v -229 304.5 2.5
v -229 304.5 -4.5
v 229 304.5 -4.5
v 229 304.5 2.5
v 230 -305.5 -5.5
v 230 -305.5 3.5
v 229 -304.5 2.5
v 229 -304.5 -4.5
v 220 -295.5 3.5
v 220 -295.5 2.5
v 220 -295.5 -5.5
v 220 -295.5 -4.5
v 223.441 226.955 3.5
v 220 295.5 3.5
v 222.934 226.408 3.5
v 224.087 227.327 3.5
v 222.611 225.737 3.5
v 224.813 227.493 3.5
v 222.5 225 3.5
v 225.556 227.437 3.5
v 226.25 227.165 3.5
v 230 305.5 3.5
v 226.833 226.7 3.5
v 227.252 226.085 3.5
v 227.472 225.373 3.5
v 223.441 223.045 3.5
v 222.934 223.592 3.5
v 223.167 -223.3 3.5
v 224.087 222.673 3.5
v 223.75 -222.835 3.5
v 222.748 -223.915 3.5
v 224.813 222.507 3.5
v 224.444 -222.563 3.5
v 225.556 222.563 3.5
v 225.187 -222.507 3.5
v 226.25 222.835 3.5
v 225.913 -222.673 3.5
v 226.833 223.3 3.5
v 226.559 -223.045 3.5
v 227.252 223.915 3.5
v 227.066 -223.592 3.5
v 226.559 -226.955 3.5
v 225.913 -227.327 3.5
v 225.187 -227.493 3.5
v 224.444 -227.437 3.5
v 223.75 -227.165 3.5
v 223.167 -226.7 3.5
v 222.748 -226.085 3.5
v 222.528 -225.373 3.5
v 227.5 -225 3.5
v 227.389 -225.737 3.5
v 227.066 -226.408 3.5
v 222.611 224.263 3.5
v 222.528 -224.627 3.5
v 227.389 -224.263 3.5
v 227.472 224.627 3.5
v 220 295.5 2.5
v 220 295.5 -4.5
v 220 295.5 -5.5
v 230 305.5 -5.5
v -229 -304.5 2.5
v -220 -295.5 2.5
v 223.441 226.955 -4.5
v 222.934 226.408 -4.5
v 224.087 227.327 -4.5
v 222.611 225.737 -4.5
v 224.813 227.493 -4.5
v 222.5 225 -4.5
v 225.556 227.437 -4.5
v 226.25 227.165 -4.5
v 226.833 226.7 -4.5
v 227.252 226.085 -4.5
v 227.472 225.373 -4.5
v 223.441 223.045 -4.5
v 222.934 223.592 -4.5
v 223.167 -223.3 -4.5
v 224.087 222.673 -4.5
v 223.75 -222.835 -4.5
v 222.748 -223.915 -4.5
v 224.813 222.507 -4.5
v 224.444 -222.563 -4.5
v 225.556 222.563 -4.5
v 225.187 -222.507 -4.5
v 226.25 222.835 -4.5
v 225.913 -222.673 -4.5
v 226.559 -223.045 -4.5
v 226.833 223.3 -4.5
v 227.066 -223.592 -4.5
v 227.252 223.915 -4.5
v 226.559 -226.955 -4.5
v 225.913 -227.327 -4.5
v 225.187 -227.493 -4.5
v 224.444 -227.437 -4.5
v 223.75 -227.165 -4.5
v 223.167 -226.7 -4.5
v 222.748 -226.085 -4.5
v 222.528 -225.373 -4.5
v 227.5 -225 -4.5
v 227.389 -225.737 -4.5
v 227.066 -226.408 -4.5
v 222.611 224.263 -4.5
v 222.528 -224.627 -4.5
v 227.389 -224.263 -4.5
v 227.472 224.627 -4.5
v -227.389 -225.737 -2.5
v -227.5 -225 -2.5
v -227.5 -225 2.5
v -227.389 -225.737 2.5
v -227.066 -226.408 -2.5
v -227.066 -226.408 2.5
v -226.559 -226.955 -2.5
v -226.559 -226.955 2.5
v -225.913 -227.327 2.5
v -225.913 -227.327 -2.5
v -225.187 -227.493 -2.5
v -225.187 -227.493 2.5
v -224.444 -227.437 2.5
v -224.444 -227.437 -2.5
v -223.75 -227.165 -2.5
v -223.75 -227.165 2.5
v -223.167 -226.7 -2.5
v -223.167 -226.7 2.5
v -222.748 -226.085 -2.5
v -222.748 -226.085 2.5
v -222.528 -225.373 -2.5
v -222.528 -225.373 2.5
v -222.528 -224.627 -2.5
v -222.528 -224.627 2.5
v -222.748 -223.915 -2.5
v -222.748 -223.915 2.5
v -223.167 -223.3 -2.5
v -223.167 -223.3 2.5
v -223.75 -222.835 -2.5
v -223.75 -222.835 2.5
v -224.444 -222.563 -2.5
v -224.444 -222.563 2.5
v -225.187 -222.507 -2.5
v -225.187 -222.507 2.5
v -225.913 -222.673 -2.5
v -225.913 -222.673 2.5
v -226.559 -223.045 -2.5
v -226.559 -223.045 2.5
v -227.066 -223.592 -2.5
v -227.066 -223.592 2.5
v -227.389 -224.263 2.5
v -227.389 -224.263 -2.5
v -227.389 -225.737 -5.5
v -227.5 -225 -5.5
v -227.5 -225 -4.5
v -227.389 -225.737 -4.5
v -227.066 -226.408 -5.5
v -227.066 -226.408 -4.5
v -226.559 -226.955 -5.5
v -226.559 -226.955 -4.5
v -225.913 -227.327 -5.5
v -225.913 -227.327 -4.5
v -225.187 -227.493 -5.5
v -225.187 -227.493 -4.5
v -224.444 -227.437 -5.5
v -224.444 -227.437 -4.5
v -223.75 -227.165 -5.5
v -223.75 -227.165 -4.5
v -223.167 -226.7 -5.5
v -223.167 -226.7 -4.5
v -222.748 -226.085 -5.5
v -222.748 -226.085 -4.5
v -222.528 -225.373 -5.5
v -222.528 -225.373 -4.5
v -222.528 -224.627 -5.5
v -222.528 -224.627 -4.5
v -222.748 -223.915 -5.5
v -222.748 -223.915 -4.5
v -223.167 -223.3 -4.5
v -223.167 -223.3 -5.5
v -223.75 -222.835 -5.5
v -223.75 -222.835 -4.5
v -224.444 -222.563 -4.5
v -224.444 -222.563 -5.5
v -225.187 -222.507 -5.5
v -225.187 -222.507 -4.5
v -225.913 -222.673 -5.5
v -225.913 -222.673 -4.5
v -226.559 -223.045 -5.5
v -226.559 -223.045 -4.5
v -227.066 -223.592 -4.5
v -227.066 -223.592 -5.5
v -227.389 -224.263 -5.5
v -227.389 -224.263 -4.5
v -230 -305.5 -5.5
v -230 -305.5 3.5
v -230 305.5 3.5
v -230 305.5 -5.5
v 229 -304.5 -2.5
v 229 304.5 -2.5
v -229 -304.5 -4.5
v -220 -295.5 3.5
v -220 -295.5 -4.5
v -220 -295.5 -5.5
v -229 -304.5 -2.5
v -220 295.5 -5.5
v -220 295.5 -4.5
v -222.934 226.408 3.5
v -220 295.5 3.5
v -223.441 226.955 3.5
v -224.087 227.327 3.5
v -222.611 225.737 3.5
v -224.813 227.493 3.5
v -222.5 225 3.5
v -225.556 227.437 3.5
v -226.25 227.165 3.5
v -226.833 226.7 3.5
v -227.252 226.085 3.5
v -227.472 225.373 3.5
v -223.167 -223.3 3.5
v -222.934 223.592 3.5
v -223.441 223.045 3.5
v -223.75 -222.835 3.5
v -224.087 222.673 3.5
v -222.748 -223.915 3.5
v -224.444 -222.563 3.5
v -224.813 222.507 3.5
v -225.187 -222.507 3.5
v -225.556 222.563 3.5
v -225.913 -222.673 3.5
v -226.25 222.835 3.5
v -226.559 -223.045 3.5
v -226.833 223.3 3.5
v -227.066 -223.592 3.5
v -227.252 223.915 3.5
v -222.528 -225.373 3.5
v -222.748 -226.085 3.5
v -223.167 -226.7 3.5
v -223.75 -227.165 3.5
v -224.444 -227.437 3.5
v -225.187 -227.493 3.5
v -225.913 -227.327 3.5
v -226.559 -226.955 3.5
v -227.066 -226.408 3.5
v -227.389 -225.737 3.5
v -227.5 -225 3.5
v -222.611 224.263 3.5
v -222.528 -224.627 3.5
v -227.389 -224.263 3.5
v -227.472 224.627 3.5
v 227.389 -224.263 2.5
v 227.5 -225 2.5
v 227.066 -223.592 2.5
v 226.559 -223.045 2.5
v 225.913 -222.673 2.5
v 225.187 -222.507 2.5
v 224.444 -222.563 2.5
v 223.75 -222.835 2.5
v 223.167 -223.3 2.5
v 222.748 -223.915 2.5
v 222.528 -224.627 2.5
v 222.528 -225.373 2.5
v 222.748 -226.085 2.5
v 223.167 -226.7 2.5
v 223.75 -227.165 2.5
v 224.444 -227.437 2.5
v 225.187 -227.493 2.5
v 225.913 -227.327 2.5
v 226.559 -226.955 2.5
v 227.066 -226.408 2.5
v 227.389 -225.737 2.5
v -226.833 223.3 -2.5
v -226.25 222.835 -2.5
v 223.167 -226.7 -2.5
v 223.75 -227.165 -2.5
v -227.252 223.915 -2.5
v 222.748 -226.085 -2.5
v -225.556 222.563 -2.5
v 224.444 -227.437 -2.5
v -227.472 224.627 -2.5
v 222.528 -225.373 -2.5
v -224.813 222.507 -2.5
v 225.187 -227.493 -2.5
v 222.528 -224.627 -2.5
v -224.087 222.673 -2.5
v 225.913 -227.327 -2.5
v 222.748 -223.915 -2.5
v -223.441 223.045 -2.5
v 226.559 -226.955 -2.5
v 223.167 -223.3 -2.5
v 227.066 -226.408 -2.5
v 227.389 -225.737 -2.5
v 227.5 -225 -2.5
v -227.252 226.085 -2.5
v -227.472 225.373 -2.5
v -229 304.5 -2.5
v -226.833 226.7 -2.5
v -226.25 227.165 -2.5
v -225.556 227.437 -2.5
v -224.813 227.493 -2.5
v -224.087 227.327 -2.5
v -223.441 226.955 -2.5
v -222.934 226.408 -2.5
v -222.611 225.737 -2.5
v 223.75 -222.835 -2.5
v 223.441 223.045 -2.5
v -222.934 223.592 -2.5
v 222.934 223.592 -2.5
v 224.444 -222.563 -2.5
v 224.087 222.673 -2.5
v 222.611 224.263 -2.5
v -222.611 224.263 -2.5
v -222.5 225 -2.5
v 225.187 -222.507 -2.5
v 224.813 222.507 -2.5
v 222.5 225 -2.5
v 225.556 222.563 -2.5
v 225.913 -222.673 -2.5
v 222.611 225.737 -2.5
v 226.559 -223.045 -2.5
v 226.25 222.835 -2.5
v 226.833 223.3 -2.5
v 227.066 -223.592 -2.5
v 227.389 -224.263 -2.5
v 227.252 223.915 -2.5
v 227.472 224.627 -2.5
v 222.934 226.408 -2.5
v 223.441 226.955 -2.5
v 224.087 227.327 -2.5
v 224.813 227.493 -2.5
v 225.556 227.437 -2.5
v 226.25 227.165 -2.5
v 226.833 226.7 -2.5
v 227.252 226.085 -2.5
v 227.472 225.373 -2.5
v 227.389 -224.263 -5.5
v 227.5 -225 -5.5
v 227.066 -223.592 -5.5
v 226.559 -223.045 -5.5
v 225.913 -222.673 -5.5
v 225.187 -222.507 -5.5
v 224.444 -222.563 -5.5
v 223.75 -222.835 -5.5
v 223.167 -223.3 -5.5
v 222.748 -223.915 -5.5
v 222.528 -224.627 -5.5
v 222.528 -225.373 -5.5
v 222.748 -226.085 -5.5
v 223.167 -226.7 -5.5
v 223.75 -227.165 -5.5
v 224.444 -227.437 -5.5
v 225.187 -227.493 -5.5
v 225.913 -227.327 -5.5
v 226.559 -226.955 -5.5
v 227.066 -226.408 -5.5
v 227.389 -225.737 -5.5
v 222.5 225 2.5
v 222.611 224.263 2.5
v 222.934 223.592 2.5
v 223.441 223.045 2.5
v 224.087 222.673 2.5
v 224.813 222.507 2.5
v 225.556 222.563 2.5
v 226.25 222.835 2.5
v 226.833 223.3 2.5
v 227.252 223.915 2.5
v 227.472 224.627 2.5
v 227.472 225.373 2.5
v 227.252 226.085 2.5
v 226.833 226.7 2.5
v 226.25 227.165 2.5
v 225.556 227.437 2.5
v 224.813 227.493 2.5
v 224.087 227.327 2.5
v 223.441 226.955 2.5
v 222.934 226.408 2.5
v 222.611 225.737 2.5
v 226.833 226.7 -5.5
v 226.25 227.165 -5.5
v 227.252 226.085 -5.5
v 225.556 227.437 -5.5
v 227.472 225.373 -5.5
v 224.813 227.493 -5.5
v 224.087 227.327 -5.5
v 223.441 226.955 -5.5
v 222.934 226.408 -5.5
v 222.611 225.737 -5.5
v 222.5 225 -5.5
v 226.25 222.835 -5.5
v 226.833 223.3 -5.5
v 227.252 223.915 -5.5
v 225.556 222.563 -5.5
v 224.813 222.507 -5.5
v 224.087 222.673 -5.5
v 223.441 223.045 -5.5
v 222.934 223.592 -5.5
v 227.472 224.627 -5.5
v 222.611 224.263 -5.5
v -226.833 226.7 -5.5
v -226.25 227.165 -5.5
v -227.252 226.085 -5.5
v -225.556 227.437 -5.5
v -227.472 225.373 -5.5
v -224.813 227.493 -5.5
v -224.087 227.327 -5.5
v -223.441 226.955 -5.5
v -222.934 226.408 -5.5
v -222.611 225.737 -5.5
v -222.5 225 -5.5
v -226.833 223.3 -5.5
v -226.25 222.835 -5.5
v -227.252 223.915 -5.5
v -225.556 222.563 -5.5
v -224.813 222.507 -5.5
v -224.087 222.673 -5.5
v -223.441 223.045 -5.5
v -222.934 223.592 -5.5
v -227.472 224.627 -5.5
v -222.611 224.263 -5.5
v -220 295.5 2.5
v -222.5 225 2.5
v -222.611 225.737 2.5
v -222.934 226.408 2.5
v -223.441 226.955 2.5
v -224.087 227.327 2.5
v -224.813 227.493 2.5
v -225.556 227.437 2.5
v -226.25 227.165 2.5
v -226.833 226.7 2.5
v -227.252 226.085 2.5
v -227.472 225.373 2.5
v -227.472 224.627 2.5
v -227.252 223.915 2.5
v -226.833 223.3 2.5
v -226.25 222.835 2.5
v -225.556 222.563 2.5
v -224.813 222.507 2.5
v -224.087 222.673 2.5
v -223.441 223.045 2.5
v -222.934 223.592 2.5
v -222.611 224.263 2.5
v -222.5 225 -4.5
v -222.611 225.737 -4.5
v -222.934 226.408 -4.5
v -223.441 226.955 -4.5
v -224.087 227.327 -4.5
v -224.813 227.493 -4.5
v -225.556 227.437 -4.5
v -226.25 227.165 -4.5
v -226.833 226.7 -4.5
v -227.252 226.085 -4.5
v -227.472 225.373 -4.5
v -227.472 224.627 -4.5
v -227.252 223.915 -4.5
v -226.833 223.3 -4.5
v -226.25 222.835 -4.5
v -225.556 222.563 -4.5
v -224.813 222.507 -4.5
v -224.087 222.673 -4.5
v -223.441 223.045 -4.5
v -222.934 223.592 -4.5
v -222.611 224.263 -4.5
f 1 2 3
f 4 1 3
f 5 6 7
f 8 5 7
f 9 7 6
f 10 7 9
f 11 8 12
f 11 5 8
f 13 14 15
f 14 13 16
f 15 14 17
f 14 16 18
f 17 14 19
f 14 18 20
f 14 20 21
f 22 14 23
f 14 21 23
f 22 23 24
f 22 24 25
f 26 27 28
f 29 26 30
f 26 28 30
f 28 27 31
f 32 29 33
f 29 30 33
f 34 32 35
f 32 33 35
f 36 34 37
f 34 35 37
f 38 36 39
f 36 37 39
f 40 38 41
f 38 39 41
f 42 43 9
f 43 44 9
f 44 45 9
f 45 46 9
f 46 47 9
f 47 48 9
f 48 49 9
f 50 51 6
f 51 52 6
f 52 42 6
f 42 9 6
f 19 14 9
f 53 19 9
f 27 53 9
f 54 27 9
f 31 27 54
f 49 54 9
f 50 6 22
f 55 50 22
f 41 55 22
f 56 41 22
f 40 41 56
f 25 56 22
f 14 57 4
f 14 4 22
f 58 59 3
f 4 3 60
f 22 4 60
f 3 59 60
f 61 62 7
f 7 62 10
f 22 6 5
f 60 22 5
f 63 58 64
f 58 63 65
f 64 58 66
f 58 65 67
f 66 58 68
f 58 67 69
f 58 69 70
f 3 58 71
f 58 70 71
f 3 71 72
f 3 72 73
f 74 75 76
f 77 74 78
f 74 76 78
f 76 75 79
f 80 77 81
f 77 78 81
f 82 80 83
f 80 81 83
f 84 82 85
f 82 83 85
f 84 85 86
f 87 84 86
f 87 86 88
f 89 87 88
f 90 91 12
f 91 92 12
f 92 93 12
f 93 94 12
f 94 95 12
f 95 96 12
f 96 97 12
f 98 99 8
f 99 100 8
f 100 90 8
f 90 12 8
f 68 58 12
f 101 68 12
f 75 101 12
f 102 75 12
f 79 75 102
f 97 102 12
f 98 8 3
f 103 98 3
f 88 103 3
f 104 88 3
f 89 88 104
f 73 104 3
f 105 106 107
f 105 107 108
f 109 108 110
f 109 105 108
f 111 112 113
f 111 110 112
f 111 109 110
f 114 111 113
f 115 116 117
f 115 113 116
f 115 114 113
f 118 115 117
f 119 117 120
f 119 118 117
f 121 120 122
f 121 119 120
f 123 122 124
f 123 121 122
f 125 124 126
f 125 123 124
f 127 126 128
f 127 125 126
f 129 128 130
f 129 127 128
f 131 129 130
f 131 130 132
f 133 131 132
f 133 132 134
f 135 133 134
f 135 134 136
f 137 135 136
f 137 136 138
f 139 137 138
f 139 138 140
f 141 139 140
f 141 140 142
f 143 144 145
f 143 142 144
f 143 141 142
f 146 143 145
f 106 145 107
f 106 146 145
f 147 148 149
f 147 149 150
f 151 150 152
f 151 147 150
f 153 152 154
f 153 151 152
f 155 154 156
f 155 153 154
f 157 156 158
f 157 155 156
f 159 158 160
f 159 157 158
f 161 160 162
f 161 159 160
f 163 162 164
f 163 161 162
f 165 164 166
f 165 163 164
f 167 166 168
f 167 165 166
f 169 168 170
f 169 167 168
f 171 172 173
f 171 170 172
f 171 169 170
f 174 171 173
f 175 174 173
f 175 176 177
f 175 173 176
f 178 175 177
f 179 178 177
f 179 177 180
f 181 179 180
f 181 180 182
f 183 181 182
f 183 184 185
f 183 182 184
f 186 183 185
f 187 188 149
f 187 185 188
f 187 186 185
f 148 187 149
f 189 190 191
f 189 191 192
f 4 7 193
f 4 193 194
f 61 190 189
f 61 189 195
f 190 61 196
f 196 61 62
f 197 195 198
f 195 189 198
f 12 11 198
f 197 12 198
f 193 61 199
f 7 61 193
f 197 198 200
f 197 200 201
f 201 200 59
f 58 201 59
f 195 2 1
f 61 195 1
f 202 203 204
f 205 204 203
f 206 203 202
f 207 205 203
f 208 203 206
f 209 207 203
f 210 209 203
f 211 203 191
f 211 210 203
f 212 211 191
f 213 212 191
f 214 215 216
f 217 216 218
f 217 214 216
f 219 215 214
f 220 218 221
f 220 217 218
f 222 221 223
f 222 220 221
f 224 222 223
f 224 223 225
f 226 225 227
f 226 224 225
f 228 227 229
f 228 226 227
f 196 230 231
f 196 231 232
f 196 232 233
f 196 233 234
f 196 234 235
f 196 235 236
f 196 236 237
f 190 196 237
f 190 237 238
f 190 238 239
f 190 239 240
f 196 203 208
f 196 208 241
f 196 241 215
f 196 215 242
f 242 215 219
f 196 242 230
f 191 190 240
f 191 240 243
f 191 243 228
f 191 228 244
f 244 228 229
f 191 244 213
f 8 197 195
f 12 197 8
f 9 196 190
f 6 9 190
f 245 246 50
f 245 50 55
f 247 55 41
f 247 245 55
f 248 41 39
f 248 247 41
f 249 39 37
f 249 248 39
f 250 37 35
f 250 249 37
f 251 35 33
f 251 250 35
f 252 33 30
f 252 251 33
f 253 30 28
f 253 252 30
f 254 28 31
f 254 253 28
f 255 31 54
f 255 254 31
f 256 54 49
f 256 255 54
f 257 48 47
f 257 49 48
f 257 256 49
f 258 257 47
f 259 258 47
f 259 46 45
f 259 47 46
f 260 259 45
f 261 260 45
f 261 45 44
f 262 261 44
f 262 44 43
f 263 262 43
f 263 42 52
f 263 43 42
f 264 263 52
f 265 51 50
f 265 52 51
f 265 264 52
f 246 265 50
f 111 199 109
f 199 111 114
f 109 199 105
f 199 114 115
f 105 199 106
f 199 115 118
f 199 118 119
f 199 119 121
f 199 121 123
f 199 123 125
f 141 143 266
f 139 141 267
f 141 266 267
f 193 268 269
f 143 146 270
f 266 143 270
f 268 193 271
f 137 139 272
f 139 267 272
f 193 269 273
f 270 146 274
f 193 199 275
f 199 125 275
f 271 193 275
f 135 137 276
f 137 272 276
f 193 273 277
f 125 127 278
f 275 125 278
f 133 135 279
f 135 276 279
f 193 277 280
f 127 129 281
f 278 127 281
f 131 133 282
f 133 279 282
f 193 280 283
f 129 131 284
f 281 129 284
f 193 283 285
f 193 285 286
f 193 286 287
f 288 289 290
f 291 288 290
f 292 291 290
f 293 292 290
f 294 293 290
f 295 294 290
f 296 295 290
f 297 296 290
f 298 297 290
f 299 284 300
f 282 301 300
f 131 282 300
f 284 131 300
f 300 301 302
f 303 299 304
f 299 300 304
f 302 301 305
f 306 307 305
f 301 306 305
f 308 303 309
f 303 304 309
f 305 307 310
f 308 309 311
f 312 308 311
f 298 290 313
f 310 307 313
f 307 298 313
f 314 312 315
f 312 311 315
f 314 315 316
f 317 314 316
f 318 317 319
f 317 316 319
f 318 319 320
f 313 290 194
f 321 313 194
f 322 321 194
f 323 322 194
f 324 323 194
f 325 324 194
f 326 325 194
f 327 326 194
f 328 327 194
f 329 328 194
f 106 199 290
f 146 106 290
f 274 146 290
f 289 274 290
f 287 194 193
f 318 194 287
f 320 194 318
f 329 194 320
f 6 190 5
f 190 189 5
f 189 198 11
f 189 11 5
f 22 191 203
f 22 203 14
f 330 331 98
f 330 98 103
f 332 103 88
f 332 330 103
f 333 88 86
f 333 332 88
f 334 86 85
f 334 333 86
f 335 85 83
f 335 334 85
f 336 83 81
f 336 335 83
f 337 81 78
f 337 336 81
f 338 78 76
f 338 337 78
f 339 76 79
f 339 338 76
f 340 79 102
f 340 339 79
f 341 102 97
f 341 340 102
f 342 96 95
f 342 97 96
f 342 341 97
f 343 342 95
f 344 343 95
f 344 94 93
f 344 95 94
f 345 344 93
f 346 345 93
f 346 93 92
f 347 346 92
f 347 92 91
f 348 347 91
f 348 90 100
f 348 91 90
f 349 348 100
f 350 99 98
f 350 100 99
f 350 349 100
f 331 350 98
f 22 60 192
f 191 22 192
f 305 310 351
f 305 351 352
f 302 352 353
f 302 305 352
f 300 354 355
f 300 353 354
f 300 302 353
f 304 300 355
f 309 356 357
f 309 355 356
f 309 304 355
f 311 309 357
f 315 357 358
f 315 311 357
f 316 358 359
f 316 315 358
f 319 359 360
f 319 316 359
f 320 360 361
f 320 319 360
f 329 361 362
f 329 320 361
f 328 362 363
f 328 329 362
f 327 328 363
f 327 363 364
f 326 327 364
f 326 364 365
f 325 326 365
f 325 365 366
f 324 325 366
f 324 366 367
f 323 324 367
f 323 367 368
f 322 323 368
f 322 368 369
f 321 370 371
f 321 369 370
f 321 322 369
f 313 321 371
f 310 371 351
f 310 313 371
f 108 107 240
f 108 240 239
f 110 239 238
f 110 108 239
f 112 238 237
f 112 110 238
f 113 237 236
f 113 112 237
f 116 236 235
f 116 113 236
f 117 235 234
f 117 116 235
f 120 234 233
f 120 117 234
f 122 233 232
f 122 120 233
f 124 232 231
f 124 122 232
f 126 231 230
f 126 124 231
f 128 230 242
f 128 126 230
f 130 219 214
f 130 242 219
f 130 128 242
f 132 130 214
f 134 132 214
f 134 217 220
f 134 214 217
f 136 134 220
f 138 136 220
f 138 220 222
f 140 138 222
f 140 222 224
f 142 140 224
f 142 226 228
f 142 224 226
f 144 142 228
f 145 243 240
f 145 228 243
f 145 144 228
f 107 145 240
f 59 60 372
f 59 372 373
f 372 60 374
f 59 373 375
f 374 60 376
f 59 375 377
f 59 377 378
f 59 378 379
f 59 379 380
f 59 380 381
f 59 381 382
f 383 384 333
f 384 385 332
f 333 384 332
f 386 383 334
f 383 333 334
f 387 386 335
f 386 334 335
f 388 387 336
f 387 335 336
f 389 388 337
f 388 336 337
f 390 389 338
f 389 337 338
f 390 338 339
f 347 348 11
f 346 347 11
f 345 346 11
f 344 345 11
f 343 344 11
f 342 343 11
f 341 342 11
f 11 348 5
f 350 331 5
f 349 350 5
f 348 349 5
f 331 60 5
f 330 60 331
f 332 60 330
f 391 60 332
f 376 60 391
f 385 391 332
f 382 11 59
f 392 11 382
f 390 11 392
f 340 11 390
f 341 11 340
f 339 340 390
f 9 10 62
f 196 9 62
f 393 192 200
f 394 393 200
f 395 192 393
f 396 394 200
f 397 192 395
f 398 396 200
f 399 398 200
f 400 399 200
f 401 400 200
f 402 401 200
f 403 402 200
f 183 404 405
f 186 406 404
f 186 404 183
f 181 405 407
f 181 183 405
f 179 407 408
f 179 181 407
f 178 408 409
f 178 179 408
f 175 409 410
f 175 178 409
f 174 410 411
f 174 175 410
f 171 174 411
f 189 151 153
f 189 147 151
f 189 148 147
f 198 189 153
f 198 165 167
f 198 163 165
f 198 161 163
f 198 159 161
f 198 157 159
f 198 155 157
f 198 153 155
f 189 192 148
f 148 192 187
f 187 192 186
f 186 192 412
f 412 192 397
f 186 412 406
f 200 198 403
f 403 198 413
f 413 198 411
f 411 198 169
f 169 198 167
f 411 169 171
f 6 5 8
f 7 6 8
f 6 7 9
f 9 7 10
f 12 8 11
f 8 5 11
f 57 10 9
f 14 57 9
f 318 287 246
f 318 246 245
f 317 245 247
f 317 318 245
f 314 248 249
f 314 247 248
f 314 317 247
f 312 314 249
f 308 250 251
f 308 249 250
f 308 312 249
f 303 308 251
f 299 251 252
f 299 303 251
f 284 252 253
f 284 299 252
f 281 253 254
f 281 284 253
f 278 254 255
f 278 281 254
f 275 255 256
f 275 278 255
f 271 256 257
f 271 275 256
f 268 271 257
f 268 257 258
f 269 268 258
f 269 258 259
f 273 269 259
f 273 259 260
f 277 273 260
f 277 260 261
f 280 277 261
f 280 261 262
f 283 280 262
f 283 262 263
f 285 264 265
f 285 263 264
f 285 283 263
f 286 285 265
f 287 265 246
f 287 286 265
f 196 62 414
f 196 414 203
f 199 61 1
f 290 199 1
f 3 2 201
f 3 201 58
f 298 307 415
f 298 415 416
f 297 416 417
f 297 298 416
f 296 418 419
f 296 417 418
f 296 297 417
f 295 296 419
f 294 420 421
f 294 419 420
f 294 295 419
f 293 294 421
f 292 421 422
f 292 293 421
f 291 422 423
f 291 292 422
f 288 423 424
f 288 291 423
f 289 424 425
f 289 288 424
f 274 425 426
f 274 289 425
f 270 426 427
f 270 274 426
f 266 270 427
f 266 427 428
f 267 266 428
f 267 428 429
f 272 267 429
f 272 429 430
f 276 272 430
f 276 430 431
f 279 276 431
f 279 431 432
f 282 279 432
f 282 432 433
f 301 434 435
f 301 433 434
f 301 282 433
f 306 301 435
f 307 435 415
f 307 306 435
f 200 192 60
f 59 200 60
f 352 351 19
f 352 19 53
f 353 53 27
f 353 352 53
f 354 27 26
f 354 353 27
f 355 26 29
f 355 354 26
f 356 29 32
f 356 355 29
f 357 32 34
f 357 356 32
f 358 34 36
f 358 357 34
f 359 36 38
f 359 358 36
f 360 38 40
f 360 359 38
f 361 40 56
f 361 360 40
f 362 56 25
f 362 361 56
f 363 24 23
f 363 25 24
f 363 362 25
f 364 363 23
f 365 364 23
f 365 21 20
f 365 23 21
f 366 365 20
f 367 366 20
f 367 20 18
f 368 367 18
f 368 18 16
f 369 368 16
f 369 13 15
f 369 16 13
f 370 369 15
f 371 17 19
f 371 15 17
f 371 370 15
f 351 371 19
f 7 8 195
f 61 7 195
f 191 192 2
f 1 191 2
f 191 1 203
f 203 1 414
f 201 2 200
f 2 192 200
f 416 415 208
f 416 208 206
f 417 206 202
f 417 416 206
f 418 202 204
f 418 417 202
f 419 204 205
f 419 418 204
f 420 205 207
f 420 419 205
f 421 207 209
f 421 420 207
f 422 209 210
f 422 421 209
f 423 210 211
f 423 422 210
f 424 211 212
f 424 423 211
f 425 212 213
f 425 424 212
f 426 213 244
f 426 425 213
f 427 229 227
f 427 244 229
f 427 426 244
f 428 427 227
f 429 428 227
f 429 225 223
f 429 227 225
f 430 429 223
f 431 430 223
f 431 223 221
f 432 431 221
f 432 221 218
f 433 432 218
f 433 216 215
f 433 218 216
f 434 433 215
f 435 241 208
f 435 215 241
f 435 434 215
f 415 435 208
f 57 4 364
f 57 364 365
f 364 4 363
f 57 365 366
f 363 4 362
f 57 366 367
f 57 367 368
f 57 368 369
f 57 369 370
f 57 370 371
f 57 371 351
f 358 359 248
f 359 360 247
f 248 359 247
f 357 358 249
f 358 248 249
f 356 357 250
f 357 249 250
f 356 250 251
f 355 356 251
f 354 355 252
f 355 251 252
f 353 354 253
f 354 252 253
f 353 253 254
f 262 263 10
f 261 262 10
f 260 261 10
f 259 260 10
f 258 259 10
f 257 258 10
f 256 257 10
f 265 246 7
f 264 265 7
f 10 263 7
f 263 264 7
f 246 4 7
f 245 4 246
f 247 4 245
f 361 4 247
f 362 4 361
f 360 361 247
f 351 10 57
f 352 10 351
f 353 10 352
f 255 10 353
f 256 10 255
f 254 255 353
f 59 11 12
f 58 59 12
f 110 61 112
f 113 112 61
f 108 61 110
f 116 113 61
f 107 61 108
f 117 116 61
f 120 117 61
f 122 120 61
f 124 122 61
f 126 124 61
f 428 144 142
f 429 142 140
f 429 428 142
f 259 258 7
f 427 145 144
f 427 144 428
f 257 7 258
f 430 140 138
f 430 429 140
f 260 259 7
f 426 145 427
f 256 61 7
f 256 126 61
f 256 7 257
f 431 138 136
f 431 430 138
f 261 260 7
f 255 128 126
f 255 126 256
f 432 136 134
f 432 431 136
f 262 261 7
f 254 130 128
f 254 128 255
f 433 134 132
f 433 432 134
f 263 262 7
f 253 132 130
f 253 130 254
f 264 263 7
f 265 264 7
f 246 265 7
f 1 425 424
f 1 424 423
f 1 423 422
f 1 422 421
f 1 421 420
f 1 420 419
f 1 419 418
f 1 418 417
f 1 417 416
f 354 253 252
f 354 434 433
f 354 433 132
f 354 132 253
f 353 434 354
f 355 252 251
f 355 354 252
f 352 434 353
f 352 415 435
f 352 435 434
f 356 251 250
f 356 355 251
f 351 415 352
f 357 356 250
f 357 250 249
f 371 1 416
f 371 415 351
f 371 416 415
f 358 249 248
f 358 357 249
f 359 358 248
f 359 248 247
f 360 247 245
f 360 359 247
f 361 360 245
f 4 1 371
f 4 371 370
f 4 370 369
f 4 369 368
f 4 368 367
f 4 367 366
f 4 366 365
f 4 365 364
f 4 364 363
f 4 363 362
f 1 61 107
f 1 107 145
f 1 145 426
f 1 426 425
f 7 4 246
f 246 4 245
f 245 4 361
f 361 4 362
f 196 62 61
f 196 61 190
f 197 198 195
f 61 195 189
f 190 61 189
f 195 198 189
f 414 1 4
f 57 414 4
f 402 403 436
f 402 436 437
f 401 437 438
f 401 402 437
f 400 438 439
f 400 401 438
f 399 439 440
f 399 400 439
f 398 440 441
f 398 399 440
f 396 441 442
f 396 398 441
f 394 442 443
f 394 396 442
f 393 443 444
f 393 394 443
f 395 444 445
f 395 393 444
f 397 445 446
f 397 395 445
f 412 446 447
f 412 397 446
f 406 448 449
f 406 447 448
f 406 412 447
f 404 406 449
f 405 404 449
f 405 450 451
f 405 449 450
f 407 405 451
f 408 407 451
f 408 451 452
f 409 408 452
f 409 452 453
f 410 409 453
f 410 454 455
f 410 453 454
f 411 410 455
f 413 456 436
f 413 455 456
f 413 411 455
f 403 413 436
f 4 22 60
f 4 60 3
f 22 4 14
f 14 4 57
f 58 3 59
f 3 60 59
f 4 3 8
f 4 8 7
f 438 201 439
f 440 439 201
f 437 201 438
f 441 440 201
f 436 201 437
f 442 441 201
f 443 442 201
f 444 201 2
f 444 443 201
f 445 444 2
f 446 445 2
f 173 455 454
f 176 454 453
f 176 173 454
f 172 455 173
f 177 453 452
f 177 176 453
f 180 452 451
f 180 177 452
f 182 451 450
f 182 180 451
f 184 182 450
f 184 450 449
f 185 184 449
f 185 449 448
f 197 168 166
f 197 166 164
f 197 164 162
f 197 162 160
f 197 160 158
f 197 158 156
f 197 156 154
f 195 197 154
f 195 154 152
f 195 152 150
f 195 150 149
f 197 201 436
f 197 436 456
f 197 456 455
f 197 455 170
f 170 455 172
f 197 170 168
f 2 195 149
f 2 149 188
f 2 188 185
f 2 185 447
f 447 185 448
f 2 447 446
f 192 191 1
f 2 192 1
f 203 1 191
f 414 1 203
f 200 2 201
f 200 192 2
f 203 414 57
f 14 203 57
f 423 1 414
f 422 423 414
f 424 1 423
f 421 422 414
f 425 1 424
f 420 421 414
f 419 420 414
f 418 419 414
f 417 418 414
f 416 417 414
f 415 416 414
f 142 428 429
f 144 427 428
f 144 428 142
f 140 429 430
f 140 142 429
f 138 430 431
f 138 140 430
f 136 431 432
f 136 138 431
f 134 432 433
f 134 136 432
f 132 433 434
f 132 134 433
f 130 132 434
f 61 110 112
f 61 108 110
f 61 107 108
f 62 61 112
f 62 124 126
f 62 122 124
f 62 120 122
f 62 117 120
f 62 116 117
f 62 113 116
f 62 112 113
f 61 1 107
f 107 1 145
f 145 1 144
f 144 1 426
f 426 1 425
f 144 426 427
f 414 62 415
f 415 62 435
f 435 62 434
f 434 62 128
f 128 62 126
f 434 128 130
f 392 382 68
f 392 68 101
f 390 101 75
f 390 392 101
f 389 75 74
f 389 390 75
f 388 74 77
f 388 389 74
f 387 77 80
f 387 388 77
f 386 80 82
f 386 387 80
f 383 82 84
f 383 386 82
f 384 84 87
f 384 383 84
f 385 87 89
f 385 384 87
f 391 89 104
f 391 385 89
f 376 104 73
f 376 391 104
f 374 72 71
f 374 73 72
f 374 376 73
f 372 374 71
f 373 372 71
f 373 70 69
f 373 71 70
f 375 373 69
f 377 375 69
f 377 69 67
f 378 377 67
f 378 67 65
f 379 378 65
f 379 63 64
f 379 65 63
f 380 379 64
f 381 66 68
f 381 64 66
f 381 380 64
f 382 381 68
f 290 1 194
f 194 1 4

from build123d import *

# Parameters (mm, degrees)
SKETCH1_W                  = 458
SKETCH1_H                  = 609
BOSS_EXTRUDE1_DEPTH        = 2.5
BOSS_EXTRUDE2_DEPTH        = 305.5
BOSS_EXTRUDE2_DEPTH_BACK   = 305.5
BOSS_EXTRUDE2_2_DEPTH      = 305.5
BOSS_EXTRUDE2_2_DEPTH_BACK = 305.5
CUT_EXTRUDE1_DEPTH         = 383.440191403
CUT_EXTRUDE1_DEPTH_BACK    = 383.440191403
BOSS_EXTRUDE3_START        = -5.5
BOSS_EXTRUDE3_DEPTH        = 1
BOSS_EXTRUDE3_START_2      = 2.5
BOSS_EXTRUDE3_2_DEPTH      = 1
BOSS_EXTRUDE3_START_3      = -4.5
BOSS_EXTRUDE3_3_DEPTH      = 7
BOSS_EXTRUDE3_4_DEPTH      = 1
BOSS_EXTRUDE3_5_DEPTH      = 1
BOSS_EXTRUDE3_6_DEPTH      = 7
CUT_EXTRUDE2_DEPTH         = 383.440191403
CUT_EXTRUDE2_DEPTH_BACK    = 383.440191403
SKETCH5_R                  = 2.5


# Read off the part's stored shape, not the designer's step: Boss-Extrude3
with BuildPart() as part:
    # Sketch1 → Boss-Extrude1 (new, symmetric)
    with BuildSketch(Plane.XY):
        Rectangle(SKETCH1_W, SKETCH1_H)
    extrude(amount=BOSS_EXTRUDE1_DEPTH, both=True)


with BuildPart() as body_2:
    # Sketch2 → Boss-Extrude2 (new, two sides: drawn at the far end of the back side and taken through both)
    with BuildSketch(Plane(origin=(0, 0, 0), x_dir=(1, 0, 0), z_dir=(0, 1, 0)).offset(-BOSS_EXTRUDE2_DEPTH_BACK)):
        Polygon((-229, -2.5), (-220, -2.5), (-220, -3.5), (-230, -3.5), (-230, 5.5), (-220, 5.5), (-220, 4.5), (-229, 4.5), align=None)
    extrude(amount=BOSS_EXTRUDE2_DEPTH + BOSS_EXTRUDE2_DEPTH_BACK)


with BuildPart() as body_3:
    # Sketch2 → Boss-Extrude2 2 (new, two sides: drawn at the far end of the back side and taken through both)
    with BuildSketch(Plane(origin=(0, 0, 0), x_dir=(1, 0, 0), z_dir=(0, 1, 0)).offset(-BOSS_EXTRUDE2_2_DEPTH_BACK)):
        Polygon((229, 4.5), (229, -2.5), (220, -2.5), (220, -3.5), (230, -3.5), (230, 5.5), (220, 5.5), (220, 4.5), align=None)
    extrude(amount=BOSS_EXTRUDE2_2_DEPTH + BOSS_EXTRUDE2_2_DEPTH_BACK)


with BuildPart() as cut_extrude1_tool:
    # Sketch3 → Cut-Extrude1 (new, two sides: drawn at the far end of the back side and taken through both)
    with BuildSketch(Plane.XY.offset(-CUT_EXTRUDE1_DEPTH_BACK)):
        Polygon((-230, 305.5), (-220, 295.5), (-220, 305.5), align=None)
        Polygon((220, 305.5), (230, 305.5), (220, 295.5), align=None)
        Polygon((230, -305.5), (220, -295.5), (220, -305.5), align=None)
        Polygon((-220, -305.5), (-230, -305.5), (-220, -295.5), align=None)
    extrude(amount=CUT_EXTRUDE1_DEPTH + CUT_EXTRUDE1_DEPTH_BACK)


with BuildPart() as body_2_1:
    add(body_2.part)

    # Cut-Extrude1: cut by cut_extrude1_tool
    add(cut_extrude1_tool.part, mode=Mode.SUBTRACT)


with BuildPart() as body_3_1:
    add(body_3.part)

    # Cut-Extrude1: cut by cut_extrude1_tool
    add(cut_extrude1_tool.part, mode=Mode.SUBTRACT)


with BuildPart() as body_4:
    # Boss-Extrude3 outline → Boss-Extrude3 (new body)
    with BuildSketch(Plane.XY.offset(BOSS_EXTRUDE3_START)):
        Polygon((220, -295.5), (-220, -295.5), (-230, -305.5), (230, -305.5), align=None)
    extrude(amount=BOSS_EXTRUDE3_DEPTH)

    # Boss-Extrude3 2 outline → Boss-Extrude3 2 (add)
    with BuildSketch(Plane.XY.offset(BOSS_EXTRUDE3_START_2)):
        Polygon((220, -295.5), (-220, -295.5), (-230, -305.5), (230, -305.5), align=None)
    extrude(amount=BOSS_EXTRUDE3_2_DEPTH)

    # Boss-Extrude3 3 outline → Boss-Extrude3 3 (add)
    with BuildSketch(Plane.XY.offset(BOSS_EXTRUDE3_START_3)):
        Polygon((229, -304.5), (-229, -304.5), (-230, -305.5), (230, -305.5), align=None)
    extrude(amount=BOSS_EXTRUDE3_3_DEPTH)


with BuildPart() as body_5:
    # Boss-Extrude3 4 outline → Boss-Extrude3 4 (new body)
    with BuildSketch(Plane.XY.offset(BOSS_EXTRUDE3_START)):
        Polygon((230, 305.5), (-230, 305.5), (-220, 295.5), (220, 295.5), align=None)
    extrude(amount=BOSS_EXTRUDE3_4_DEPTH)

    # Boss-Extrude3 5 outline → Boss-Extrude3 5 (add)
    with BuildSketch(Plane.XY.offset(BOSS_EXTRUDE3_START_2)):
        Polygon((230, 305.5), (-230, 305.5), (-220, 295.5), (220, 295.5), align=None)
    extrude(amount=BOSS_EXTRUDE3_5_DEPTH)

    # Boss-Extrude3 6 outline → Boss-Extrude3 6 (add)
    with BuildSketch(Plane.XY.offset(BOSS_EXTRUDE3_START_3)):
        Polygon((230, 305.5), (-230, 305.5), (-229, 304.5), (229, 304.5), align=None)
    extrude(amount=BOSS_EXTRUDE3_6_DEPTH)


with BuildPart() as cut_extrude2_tool:
    # Sketch5 → Cut-Extrude2 (new, two sides: drawn at the far end of the back side and taken through both)
    with BuildSketch(Plane.XY.offset(-CUT_EXTRUDE2_DEPTH_BACK)):
        with Locations((-225, 225)):
            Circle(SKETCH5_R)
        with Locations(Location((-225, -225, 0), (0, 0, 180))):
            Circle(SKETCH5_R)
        with Locations((225, -225)):
            Circle(SKETCH5_R)
        with Locations(Location((225, 225, 0), (0, 0, 180))):
            Circle(SKETCH5_R)
    extrude(amount=CUT_EXTRUDE2_DEPTH + CUT_EXTRUDE2_DEPTH_BACK)


with BuildPart() as part_1:
    add(part.part)

    # Cut-Extrude2: cut by cut_extrude2_tool
    add(cut_extrude2_tool.part, mode=Mode.SUBTRACT)


with BuildPart() as body_2_2:
    add(body_2_1.part)

    # Cut-Extrude2: cut by cut_extrude2_tool
    add(cut_extrude2_tool.part, mode=Mode.SUBTRACT)


with BuildPart() as body_3_2:
    add(body_3_1.part)

    # Cut-Extrude2: cut by cut_extrude2_tool
    add(cut_extrude2_tool.part, mode=Mode.SUBTRACT)


solid = Compound([body_4.part, body_5.part, part_1.part, body_2_2.part, body_3_2.part])
